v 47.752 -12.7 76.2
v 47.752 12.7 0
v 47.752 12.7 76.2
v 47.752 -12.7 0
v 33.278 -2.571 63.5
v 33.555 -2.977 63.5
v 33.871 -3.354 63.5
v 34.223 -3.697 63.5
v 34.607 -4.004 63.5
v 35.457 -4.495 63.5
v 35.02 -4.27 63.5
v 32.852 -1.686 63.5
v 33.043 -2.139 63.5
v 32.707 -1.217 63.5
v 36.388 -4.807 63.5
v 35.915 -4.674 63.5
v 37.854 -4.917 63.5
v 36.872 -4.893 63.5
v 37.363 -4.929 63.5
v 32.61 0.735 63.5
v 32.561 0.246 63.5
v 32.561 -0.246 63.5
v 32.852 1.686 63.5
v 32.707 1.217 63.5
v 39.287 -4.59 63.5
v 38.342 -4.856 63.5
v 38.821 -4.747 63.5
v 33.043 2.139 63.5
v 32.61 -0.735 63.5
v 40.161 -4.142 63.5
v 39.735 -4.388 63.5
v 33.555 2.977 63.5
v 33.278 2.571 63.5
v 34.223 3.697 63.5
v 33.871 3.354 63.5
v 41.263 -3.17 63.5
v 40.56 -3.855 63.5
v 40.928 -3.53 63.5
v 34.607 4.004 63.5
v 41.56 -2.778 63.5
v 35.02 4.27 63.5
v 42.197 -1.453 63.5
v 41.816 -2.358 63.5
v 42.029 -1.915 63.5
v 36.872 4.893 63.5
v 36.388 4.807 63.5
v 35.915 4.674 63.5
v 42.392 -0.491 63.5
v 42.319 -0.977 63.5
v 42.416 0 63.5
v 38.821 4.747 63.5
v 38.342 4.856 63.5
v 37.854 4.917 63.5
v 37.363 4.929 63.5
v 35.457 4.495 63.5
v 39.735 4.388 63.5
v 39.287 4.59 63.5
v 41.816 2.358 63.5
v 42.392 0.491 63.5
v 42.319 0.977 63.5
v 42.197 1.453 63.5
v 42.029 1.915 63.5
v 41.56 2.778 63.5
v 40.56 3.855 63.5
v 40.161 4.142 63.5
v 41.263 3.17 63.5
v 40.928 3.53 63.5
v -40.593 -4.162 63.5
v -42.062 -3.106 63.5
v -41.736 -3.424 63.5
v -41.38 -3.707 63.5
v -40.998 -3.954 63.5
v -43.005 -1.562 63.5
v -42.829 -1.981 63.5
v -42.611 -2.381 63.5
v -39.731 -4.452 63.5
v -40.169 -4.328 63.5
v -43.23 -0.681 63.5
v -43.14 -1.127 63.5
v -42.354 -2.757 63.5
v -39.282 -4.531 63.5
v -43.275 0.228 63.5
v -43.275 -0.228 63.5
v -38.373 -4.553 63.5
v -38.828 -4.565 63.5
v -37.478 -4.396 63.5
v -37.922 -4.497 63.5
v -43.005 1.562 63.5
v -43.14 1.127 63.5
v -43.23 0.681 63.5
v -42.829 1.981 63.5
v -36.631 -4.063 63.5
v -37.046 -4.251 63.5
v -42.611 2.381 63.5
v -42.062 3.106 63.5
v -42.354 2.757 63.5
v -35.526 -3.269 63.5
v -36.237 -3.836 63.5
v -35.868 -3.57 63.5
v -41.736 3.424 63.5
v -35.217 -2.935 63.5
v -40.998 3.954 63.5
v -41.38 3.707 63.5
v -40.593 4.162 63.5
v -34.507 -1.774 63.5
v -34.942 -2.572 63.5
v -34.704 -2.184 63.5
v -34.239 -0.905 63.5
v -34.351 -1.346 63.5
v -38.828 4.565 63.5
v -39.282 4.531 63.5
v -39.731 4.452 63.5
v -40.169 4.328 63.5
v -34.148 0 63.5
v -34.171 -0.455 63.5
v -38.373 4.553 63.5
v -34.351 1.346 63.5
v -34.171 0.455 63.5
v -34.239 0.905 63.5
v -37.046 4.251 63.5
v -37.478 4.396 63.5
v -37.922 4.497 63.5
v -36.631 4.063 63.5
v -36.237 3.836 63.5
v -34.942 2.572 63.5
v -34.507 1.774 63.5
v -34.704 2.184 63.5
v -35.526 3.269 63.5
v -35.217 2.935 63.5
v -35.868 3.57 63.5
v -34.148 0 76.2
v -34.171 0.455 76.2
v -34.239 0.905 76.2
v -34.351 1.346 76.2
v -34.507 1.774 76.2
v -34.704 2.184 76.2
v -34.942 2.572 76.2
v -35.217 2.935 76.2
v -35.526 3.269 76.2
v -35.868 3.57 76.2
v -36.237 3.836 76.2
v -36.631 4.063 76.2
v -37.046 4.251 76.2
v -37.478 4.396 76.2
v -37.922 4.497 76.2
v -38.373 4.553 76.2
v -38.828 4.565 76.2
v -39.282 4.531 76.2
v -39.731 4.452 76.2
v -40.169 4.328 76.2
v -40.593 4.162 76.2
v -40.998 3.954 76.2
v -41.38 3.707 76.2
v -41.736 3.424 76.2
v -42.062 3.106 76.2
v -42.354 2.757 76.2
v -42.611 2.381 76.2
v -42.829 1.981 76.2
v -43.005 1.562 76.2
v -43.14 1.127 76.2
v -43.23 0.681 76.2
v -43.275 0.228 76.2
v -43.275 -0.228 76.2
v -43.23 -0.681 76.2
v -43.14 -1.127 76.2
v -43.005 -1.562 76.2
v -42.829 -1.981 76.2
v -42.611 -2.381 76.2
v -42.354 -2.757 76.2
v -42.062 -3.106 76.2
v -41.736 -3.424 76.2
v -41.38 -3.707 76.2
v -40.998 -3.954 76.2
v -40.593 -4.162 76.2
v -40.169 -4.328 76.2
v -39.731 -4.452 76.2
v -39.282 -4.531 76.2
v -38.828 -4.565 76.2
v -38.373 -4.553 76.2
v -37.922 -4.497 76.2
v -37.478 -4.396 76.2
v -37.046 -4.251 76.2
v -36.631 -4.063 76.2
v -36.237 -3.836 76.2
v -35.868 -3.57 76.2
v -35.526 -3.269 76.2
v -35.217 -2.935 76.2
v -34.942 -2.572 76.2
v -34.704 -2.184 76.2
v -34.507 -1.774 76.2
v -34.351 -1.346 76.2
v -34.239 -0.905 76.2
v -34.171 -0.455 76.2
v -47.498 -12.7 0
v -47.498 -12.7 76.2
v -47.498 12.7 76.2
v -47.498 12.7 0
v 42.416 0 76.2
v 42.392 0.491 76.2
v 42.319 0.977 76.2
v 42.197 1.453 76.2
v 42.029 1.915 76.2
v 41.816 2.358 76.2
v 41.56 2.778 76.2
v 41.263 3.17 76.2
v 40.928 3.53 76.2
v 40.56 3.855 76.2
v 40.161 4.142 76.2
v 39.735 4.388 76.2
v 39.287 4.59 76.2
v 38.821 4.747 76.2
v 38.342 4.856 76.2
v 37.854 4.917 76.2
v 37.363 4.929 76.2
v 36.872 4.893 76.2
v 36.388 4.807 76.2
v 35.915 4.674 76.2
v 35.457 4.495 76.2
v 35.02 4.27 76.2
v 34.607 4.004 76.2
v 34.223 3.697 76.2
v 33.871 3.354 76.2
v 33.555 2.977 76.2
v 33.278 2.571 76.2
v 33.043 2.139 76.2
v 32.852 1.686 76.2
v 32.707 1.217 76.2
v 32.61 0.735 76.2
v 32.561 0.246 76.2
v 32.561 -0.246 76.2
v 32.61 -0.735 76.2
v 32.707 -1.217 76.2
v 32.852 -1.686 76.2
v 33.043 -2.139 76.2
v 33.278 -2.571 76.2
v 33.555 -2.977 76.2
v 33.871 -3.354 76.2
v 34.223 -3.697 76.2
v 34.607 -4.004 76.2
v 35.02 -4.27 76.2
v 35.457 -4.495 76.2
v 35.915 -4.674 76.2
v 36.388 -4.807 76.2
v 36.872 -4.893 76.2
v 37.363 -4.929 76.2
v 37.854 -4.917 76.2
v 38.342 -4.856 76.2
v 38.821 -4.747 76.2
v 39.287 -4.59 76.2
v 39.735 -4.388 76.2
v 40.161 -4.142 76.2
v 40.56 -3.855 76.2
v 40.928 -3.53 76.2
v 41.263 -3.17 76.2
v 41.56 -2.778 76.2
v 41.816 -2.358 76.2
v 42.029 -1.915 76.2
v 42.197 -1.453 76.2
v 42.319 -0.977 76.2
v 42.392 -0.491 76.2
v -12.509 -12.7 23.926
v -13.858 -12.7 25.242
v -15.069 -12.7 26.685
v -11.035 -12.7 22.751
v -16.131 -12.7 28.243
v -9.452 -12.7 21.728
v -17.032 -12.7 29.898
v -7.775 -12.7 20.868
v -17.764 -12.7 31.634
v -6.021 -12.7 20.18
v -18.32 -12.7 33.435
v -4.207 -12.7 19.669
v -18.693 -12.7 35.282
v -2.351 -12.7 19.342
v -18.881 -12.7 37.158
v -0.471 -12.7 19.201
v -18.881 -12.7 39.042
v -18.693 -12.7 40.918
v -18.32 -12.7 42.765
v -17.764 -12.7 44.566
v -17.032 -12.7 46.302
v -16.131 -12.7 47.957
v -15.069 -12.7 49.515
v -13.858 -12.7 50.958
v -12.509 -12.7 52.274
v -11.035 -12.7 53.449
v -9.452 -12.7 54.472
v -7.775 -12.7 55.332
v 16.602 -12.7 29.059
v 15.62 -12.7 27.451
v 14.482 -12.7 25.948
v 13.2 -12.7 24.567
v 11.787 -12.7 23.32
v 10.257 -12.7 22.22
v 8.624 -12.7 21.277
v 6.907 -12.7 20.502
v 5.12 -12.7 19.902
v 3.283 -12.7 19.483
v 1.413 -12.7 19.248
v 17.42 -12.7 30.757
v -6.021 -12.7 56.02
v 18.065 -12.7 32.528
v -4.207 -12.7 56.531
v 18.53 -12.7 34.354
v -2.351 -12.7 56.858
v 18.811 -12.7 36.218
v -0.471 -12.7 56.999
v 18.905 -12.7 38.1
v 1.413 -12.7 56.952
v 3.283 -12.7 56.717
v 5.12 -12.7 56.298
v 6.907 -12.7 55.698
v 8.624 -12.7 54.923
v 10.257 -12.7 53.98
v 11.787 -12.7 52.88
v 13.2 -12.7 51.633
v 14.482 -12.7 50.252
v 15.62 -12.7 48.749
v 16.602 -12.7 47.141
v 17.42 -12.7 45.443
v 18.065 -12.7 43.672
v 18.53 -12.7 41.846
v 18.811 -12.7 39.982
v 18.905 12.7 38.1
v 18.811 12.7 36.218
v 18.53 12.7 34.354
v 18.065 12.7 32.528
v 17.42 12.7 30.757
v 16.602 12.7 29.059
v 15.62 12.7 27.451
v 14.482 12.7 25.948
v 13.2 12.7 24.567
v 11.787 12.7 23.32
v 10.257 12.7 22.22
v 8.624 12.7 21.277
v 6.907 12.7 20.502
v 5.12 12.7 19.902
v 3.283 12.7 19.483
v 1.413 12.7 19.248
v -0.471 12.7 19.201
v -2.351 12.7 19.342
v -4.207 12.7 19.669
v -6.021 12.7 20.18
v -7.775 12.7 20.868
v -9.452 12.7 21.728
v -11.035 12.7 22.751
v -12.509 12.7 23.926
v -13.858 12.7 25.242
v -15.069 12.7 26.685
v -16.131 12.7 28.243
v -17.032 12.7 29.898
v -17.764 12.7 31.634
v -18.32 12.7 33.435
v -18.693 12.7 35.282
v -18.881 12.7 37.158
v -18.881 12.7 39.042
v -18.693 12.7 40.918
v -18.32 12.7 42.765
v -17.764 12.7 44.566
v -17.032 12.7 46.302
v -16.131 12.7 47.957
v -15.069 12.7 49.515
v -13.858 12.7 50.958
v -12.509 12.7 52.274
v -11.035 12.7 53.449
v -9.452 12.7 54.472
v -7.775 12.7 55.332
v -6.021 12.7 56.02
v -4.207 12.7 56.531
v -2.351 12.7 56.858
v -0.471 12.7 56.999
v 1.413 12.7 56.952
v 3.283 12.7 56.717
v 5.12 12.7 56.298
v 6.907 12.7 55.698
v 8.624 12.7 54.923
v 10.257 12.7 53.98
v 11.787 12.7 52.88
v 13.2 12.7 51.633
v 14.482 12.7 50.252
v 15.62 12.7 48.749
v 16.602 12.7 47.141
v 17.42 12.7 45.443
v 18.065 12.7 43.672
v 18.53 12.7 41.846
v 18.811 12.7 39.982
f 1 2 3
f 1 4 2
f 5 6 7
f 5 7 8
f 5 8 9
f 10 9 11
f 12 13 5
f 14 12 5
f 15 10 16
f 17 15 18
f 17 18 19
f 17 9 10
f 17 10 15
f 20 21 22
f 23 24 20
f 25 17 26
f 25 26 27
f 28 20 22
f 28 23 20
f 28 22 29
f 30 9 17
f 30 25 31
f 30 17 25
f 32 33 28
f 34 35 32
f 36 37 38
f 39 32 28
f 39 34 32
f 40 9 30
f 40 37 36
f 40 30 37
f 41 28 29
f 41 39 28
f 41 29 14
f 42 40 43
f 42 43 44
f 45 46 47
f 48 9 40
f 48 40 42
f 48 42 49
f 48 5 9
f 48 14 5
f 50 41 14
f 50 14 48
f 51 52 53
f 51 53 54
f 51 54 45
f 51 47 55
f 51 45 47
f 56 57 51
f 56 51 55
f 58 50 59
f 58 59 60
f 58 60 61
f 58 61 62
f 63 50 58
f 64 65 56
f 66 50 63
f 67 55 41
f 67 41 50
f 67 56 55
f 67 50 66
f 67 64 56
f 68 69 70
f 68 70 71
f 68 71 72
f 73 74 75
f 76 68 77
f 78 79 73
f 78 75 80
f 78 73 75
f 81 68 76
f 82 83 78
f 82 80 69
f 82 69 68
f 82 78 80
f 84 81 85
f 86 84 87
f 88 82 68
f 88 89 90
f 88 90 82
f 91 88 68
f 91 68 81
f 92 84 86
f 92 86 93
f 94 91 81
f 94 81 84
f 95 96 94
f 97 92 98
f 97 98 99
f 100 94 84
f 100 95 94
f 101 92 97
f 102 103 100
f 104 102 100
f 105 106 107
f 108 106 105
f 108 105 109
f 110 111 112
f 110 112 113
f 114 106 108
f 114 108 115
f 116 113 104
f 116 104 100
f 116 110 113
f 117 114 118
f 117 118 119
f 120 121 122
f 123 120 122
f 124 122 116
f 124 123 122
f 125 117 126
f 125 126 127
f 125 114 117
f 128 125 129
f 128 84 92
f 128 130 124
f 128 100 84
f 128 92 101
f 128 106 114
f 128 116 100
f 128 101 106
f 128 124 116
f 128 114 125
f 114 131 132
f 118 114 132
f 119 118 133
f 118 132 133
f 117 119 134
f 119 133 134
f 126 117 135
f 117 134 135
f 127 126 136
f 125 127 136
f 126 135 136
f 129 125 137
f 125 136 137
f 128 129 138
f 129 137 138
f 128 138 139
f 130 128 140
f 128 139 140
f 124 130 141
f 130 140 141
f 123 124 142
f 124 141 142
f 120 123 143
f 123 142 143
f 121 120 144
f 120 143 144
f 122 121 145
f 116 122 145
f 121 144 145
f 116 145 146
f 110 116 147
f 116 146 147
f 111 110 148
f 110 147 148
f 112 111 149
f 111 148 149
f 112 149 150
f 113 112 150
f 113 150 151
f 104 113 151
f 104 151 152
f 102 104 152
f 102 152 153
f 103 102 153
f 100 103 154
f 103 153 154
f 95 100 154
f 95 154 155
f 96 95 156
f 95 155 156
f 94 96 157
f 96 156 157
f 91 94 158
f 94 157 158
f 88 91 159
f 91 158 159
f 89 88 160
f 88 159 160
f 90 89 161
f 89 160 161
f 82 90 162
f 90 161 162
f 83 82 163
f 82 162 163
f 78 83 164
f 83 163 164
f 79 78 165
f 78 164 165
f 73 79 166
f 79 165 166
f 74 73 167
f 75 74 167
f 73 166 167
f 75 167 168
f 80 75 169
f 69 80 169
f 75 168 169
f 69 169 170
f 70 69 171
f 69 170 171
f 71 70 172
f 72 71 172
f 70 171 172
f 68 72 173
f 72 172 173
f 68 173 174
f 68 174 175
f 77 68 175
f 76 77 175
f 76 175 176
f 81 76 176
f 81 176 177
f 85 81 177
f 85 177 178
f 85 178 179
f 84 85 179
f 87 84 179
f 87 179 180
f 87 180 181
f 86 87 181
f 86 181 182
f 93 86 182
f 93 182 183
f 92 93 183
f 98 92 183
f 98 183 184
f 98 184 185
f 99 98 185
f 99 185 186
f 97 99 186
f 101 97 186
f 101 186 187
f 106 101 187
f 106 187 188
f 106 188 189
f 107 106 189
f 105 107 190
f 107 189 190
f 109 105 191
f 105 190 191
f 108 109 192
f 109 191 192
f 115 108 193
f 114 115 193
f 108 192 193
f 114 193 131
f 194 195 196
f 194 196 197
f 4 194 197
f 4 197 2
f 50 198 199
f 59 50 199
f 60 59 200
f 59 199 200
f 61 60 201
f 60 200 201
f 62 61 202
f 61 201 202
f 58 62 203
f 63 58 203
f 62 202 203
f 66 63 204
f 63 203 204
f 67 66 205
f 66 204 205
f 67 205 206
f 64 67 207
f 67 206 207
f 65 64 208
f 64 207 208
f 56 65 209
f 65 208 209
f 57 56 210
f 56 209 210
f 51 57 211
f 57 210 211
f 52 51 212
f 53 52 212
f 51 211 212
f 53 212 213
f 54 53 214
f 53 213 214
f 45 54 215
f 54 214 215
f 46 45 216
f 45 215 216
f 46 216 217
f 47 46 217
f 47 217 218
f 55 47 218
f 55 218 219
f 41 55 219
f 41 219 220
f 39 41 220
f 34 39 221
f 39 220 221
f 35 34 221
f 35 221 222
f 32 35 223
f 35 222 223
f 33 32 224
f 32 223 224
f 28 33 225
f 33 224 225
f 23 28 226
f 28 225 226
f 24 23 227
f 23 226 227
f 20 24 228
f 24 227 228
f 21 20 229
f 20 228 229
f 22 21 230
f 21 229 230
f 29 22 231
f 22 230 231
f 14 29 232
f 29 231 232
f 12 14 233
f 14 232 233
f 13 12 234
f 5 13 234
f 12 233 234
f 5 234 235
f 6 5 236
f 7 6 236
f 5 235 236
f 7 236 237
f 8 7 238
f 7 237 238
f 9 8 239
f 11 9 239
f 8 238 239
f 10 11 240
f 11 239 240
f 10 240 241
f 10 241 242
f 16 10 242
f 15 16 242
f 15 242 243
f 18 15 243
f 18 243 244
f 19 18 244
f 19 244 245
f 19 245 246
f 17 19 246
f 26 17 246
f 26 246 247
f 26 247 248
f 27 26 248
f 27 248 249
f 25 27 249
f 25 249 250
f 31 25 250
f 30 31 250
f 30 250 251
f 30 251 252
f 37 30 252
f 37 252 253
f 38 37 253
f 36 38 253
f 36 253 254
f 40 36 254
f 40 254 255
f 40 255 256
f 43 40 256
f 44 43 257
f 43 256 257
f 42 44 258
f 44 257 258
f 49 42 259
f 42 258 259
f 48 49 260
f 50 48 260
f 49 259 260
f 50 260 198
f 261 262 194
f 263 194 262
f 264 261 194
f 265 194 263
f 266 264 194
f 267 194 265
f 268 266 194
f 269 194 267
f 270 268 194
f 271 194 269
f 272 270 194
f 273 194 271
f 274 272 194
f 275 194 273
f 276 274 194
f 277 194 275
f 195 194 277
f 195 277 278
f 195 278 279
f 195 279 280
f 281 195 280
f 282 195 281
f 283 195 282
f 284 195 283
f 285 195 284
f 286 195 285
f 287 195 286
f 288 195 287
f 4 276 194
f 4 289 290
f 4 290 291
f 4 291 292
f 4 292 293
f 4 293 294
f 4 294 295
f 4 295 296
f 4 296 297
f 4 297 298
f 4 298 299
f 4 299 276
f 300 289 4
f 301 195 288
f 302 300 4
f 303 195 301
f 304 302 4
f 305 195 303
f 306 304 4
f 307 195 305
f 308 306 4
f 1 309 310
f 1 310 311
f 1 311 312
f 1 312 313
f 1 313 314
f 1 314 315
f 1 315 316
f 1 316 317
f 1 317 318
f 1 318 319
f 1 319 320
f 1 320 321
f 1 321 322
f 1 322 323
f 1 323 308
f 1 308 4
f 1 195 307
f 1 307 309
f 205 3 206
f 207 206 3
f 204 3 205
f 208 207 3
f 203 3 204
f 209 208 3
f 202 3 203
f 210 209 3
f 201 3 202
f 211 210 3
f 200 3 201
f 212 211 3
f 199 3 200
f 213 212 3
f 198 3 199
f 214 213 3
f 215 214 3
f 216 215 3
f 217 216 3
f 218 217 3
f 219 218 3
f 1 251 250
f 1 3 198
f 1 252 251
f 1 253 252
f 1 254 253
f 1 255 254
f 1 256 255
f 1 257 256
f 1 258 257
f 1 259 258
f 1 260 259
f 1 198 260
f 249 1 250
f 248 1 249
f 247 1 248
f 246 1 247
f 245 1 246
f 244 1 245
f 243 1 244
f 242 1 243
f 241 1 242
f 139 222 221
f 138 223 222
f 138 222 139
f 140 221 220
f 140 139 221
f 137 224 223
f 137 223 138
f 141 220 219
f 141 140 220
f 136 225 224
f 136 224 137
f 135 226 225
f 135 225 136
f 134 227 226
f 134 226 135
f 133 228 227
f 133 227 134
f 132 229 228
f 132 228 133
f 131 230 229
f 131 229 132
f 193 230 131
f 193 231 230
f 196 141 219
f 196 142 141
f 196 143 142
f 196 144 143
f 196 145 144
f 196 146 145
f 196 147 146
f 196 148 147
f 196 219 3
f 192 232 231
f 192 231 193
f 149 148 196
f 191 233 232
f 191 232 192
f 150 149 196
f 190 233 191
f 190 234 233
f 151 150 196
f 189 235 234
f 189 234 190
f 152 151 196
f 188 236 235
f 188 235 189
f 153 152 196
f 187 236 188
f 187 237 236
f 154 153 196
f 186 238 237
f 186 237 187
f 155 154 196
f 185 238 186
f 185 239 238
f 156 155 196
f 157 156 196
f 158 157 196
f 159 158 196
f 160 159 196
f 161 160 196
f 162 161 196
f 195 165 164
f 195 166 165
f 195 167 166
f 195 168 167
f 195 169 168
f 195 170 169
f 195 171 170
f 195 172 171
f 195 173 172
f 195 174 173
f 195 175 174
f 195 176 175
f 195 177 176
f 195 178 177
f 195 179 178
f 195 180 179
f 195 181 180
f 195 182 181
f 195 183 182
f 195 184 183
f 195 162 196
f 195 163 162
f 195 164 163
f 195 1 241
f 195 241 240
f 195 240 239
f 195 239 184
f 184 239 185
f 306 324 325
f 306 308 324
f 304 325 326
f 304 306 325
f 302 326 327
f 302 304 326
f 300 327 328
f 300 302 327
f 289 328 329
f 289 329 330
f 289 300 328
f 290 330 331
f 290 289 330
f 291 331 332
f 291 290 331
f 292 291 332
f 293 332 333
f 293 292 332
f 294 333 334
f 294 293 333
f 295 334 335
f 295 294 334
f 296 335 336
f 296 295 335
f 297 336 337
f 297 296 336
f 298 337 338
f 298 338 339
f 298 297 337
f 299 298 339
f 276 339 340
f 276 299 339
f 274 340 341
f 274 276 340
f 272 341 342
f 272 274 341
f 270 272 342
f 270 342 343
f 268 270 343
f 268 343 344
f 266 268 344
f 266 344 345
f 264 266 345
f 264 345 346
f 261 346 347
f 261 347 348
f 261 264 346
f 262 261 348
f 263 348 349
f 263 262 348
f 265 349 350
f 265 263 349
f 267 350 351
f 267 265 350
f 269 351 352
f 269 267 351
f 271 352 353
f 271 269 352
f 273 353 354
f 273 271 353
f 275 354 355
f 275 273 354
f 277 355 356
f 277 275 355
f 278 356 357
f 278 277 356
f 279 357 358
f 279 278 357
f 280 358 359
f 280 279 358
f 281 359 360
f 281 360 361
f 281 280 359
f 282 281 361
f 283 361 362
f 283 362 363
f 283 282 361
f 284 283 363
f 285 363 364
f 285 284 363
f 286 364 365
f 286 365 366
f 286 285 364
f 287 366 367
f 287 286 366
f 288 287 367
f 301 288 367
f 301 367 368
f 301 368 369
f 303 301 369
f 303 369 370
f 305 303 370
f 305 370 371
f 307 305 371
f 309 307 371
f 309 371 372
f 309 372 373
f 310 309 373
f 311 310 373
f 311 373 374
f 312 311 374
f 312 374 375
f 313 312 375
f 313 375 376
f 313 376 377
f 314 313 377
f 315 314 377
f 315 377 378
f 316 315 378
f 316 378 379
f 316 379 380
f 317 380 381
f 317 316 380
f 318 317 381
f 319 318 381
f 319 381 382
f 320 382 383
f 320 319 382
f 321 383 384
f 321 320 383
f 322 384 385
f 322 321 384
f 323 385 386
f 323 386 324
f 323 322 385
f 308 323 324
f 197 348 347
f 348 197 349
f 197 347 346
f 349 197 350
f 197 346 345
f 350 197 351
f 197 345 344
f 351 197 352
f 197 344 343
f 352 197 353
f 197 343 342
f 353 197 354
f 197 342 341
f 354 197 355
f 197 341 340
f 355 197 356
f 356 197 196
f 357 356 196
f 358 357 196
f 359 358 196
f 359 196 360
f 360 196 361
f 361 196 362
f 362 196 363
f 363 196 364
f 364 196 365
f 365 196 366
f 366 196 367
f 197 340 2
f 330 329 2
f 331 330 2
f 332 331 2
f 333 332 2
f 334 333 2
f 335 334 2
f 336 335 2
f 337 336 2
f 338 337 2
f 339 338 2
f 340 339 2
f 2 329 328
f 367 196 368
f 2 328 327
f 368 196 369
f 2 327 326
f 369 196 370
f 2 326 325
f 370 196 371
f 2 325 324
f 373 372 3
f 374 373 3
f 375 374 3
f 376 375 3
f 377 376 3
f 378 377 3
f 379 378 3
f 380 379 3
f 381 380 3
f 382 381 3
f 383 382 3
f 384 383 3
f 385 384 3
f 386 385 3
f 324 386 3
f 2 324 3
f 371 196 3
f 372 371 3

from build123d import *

# Parameters (mm, degrees)
F1_DEPTH = 12.7
F2_R     = 4.566198
F2_R_2   = 4.930932
F3_DEPTH = 12.7


with BuildPart() as f1:
    # F0 (on Front) → F1 (new body, symmetric)
    with BuildSketch(Plane.XZ):
        with BuildLine():
            Line((47.752, 38.1), (47.752, 76.2))
            Line((47.752, 76.2), (-47.498, 76.2))
            Line((-47.498, 76.2), (-47.498, 38.1))
            Line((-47.498, 38.1), (-18.904509, 38.1))
            ThreePointArc((-18.904509, 38.1), (0, 57.004509), (18.904509, 38.1))
            Line((18.904509, 38.1), (47.752, 38.1))
        make_face()
        with BuildLine():
            Line((47.752, 0), (47.752, 38.1))
            Line((47.752, 38.1), (18.904509, 38.1))
            ThreePointArc((18.904509, 38.1), (0, 19.195491), (-18.904509, 38.1))
            Line((-18.904509, 38.1), (-47.498, 38.1))
            Line((-47.498, 38.1), (-47.498, 0))
            Line((-47.498, 0), (47.752, 0))
        make_face()
    extrude(amount=F1_DEPTH, both=True)

    # F2 (on face) → F3 (cut, symmetric)
    with BuildSketch(Plane.XY.offset(76.2)):
        with Locations((-38.714517, 0)):
            Circle(F2_R)
        with Locations((37.485483, 0)):
            Circle(F2_R_2)
    extrude(amount=F3_DEPTH, both=True, mode=Mode.SUBTRACT)


solid = f1.part
